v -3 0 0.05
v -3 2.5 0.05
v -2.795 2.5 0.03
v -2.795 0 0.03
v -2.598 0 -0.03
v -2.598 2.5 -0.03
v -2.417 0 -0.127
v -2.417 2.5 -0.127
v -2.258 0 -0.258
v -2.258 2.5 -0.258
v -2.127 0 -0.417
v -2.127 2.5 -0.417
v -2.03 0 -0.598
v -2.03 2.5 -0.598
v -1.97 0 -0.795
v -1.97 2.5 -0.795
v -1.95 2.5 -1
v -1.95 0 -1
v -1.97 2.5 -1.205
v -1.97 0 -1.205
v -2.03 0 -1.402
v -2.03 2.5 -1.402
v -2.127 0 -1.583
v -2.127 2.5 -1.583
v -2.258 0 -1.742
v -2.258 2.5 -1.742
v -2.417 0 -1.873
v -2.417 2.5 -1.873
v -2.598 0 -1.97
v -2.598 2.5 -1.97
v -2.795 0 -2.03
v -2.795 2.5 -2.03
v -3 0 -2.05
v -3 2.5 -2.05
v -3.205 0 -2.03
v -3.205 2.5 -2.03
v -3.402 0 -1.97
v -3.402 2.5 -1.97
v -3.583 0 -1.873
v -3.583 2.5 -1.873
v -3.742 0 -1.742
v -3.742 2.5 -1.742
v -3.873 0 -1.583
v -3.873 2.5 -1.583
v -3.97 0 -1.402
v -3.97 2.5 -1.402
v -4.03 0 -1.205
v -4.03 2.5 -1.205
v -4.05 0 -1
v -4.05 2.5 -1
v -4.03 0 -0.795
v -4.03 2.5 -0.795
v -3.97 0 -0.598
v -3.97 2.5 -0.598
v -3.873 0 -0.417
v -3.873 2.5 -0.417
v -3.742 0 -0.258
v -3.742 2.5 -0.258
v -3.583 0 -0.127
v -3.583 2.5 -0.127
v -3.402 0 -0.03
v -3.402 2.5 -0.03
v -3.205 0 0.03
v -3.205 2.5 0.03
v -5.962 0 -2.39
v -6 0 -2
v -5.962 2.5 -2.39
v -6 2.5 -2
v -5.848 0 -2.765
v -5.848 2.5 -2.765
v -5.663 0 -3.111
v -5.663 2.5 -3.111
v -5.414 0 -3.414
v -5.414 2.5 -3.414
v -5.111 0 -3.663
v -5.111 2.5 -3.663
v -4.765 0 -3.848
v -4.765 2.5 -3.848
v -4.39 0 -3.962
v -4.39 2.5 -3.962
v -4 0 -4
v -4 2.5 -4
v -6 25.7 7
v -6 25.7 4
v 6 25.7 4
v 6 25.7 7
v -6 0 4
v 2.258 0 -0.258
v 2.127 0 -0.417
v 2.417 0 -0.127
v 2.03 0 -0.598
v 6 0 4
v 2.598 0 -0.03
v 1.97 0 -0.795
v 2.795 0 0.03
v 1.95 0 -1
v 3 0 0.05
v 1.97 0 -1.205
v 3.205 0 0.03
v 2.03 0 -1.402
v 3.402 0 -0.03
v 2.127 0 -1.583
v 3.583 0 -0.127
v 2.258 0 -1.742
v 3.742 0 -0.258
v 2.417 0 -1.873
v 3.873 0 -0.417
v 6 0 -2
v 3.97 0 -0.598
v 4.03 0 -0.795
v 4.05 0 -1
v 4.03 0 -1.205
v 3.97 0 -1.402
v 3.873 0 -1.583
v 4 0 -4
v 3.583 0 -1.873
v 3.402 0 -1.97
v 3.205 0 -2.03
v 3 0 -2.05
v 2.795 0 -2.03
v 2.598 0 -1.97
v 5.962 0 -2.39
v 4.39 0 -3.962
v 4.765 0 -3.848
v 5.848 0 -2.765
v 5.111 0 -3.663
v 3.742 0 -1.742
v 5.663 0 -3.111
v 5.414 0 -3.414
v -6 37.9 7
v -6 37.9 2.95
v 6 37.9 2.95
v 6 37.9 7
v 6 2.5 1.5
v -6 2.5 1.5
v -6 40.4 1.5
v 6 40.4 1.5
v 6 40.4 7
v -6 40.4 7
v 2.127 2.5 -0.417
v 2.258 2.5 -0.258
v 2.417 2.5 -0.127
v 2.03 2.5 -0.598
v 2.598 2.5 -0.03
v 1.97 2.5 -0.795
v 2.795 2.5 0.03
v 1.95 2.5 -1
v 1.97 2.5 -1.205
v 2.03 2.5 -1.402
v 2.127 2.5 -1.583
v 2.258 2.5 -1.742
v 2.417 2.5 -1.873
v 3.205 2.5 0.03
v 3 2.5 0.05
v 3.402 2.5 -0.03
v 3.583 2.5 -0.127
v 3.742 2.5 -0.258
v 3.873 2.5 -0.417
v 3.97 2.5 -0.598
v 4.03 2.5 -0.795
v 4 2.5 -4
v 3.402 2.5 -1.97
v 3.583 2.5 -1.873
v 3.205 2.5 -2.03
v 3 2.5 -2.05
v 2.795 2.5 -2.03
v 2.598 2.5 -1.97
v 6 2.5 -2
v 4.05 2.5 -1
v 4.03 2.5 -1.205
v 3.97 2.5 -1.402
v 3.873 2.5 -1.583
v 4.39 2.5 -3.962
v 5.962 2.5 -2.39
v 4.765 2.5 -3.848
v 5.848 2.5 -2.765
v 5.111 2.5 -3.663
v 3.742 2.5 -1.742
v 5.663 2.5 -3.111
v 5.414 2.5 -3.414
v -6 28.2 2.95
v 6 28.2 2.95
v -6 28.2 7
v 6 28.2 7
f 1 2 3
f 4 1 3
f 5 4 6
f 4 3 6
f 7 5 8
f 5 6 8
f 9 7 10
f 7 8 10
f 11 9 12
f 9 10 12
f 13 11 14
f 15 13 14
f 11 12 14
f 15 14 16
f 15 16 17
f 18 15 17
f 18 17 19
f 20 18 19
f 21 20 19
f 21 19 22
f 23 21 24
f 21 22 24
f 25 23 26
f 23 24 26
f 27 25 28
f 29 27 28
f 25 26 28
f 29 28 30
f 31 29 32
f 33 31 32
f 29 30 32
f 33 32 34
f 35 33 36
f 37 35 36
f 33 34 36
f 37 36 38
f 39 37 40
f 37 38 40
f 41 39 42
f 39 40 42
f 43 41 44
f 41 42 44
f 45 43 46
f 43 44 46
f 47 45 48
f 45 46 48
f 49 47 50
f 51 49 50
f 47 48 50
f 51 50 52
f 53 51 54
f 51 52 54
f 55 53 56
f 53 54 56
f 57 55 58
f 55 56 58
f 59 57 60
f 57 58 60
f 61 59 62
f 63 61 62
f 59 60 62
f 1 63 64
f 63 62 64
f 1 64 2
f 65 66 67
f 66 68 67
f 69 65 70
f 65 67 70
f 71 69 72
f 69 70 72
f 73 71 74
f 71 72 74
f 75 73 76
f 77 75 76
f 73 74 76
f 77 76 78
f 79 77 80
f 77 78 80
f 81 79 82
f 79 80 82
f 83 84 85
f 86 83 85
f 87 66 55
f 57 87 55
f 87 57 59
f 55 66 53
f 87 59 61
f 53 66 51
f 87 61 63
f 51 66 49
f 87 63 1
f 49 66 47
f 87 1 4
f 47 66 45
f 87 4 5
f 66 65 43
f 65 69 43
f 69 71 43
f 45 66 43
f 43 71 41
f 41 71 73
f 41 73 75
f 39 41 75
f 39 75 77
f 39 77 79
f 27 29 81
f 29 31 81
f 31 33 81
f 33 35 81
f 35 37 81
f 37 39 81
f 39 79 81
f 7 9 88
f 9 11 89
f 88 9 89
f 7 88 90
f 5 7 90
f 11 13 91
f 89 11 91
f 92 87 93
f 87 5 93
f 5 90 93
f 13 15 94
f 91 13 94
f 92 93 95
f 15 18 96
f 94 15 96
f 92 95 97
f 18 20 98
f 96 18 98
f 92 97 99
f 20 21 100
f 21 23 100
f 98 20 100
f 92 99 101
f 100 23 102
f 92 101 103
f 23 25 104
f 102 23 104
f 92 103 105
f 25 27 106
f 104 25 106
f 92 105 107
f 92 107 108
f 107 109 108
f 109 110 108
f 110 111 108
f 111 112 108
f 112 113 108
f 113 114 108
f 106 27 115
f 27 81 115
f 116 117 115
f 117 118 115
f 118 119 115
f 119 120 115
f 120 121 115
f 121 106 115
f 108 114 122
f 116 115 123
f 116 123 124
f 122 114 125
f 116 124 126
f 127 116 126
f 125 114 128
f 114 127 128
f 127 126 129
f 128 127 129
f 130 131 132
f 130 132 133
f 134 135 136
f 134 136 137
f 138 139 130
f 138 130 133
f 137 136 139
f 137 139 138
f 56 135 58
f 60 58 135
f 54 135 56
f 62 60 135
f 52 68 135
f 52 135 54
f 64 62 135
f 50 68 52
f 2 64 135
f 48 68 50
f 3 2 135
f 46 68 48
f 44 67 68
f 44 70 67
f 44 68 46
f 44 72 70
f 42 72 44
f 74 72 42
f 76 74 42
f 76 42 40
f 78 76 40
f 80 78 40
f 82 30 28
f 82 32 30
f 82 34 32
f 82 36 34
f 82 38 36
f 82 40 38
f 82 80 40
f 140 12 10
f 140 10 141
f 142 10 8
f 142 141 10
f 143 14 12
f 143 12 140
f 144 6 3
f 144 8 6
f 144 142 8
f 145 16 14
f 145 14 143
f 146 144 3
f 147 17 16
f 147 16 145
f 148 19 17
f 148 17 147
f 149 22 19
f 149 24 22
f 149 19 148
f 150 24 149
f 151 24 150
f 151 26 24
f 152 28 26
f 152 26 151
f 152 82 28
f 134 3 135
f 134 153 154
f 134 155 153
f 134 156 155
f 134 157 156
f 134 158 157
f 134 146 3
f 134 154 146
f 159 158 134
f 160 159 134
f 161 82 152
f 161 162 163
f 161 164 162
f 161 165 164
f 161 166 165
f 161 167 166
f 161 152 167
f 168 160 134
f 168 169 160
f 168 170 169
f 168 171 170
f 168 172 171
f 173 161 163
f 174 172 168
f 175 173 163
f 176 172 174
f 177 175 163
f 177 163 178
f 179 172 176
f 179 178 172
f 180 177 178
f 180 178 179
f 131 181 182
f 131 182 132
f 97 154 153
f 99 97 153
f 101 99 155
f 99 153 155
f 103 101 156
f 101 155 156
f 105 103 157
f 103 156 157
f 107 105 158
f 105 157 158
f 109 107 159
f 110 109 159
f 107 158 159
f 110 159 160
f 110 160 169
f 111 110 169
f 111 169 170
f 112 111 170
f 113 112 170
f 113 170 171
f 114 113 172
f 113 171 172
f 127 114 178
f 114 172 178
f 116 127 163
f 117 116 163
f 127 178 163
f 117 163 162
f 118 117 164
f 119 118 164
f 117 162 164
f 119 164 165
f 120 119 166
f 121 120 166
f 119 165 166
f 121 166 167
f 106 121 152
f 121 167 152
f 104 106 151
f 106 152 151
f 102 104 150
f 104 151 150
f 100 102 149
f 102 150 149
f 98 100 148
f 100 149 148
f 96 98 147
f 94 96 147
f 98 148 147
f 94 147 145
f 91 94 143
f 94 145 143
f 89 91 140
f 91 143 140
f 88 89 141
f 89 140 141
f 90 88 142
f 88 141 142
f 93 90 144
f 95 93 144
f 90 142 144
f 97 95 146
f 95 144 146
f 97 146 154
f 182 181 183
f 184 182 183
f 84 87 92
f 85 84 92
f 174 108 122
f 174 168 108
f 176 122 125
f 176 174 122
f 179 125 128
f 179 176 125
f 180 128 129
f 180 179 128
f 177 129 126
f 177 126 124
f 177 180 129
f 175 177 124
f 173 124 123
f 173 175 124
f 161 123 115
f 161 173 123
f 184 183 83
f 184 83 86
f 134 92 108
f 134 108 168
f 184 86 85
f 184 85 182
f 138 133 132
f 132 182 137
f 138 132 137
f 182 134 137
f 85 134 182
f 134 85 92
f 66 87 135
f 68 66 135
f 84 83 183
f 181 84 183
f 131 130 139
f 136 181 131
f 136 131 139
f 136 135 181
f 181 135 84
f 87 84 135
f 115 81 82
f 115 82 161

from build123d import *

# Parameters (mm, degrees)
SKETCH1_W           = 12
SKETCH1_H           = 8
BOSS_EXTRUDE1_DEPTH = 2.5
FILLET1_R           = 2
SKETCH2_R           = 1.05
CUT_EXTRUDE1_DEPTH  = 2.5
SKETCH3_W           = 12
SKETCH3_H           = 2.5
BOSS_EXTRUDE2_DEPTH = 37.9
SKETCH5_W           = 12
SKETCH5_H           = 2.5
BOSS_EXTRUDE4_DEPTH = 3
SKETCH6_W           = 12
SKETCH6_H           = 2.5
BOSS_EXTRUDE5_DEPTH = 3
SKETCH7_W           = 1.05
SKETCH7_H           = 9.7
CUT_EXTRUDE2_DEPTH  = 15


with BuildPart() as part:
    # Sketch1 → Boss-Extrude1 (new body)
    with BuildSketch(Plane(origin=(0, 0, 0), x_dir=(1, 0, 0), z_dir=(0, 1, 0))):
        Rectangle(SKETCH1_W, SKETCH1_H)
    extrude(amount=BOSS_EXTRUDE1_DEPTH)

    # Fillet1
    fillet1_edges = [part.edges().sort_by_distance(p)[0] for p in [
        (-6, 1.25, -4),
        (6, 1.25, -4),
    ]]
    fillet(fillet1_edges, radius=FILLET1_R)

    # Sketch2 → Cut-Extrude1 (cut)
    with BuildSketch(Plane(origin=(0, 2.5, 0), x_dir=(1, 0, 0), z_dir=(0, 1, 0))):
        with Locations(Location((3, 1, 0), (0, 0, 270))):
            Circle(SKETCH2_R)
        with Locations(Location((-3, 1, 0), (0, 0, 270))):
            Circle(SKETCH2_R)
    extrude(amount=-CUT_EXTRUDE1_DEPTH, mode=Mode.SUBTRACT)

    # Sketch3 → Boss-Extrude2 (add)
    with BuildSketch(Plane(origin=(0, 2.5, 0), x_dir=(1, 0, 0), z_dir=(0, 1, 0))):
        with Locations((0, -2.75)):
            Rectangle(SKETCH3_W, SKETCH3_H)
    extrude(amount=BOSS_EXTRUDE2_DEPTH)

    # Sketch5 → Boss-Extrude4 (add)
    with BuildSketch(Plane.XY.offset(4)):
        with Locations((0, 39.15)):
            Rectangle(SKETCH5_W, SKETCH5_H)
    extrude(amount=BOSS_EXTRUDE4_DEPTH)

    # Sketch6 → Boss-Extrude5 (add)
    with BuildSketch(Plane.XY.offset(4)):
        with Locations((0, 26.95)):
            Rectangle(SKETCH6_W, SKETCH6_H)
    extrude(amount=BOSS_EXTRUDE5_DEPTH)

    # Sketch7 → Cut-Extrude2 (cut)
    with BuildSketch(Plane.ZY.offset(6)):
        with Locations((3.475, 33.05)):
            Rectangle(SKETCH7_W, SKETCH7_H)
    extrude(amount=-CUT_EXTRUDE2_DEPTH, mode=Mode.SUBTRACT)


solid = part.part
